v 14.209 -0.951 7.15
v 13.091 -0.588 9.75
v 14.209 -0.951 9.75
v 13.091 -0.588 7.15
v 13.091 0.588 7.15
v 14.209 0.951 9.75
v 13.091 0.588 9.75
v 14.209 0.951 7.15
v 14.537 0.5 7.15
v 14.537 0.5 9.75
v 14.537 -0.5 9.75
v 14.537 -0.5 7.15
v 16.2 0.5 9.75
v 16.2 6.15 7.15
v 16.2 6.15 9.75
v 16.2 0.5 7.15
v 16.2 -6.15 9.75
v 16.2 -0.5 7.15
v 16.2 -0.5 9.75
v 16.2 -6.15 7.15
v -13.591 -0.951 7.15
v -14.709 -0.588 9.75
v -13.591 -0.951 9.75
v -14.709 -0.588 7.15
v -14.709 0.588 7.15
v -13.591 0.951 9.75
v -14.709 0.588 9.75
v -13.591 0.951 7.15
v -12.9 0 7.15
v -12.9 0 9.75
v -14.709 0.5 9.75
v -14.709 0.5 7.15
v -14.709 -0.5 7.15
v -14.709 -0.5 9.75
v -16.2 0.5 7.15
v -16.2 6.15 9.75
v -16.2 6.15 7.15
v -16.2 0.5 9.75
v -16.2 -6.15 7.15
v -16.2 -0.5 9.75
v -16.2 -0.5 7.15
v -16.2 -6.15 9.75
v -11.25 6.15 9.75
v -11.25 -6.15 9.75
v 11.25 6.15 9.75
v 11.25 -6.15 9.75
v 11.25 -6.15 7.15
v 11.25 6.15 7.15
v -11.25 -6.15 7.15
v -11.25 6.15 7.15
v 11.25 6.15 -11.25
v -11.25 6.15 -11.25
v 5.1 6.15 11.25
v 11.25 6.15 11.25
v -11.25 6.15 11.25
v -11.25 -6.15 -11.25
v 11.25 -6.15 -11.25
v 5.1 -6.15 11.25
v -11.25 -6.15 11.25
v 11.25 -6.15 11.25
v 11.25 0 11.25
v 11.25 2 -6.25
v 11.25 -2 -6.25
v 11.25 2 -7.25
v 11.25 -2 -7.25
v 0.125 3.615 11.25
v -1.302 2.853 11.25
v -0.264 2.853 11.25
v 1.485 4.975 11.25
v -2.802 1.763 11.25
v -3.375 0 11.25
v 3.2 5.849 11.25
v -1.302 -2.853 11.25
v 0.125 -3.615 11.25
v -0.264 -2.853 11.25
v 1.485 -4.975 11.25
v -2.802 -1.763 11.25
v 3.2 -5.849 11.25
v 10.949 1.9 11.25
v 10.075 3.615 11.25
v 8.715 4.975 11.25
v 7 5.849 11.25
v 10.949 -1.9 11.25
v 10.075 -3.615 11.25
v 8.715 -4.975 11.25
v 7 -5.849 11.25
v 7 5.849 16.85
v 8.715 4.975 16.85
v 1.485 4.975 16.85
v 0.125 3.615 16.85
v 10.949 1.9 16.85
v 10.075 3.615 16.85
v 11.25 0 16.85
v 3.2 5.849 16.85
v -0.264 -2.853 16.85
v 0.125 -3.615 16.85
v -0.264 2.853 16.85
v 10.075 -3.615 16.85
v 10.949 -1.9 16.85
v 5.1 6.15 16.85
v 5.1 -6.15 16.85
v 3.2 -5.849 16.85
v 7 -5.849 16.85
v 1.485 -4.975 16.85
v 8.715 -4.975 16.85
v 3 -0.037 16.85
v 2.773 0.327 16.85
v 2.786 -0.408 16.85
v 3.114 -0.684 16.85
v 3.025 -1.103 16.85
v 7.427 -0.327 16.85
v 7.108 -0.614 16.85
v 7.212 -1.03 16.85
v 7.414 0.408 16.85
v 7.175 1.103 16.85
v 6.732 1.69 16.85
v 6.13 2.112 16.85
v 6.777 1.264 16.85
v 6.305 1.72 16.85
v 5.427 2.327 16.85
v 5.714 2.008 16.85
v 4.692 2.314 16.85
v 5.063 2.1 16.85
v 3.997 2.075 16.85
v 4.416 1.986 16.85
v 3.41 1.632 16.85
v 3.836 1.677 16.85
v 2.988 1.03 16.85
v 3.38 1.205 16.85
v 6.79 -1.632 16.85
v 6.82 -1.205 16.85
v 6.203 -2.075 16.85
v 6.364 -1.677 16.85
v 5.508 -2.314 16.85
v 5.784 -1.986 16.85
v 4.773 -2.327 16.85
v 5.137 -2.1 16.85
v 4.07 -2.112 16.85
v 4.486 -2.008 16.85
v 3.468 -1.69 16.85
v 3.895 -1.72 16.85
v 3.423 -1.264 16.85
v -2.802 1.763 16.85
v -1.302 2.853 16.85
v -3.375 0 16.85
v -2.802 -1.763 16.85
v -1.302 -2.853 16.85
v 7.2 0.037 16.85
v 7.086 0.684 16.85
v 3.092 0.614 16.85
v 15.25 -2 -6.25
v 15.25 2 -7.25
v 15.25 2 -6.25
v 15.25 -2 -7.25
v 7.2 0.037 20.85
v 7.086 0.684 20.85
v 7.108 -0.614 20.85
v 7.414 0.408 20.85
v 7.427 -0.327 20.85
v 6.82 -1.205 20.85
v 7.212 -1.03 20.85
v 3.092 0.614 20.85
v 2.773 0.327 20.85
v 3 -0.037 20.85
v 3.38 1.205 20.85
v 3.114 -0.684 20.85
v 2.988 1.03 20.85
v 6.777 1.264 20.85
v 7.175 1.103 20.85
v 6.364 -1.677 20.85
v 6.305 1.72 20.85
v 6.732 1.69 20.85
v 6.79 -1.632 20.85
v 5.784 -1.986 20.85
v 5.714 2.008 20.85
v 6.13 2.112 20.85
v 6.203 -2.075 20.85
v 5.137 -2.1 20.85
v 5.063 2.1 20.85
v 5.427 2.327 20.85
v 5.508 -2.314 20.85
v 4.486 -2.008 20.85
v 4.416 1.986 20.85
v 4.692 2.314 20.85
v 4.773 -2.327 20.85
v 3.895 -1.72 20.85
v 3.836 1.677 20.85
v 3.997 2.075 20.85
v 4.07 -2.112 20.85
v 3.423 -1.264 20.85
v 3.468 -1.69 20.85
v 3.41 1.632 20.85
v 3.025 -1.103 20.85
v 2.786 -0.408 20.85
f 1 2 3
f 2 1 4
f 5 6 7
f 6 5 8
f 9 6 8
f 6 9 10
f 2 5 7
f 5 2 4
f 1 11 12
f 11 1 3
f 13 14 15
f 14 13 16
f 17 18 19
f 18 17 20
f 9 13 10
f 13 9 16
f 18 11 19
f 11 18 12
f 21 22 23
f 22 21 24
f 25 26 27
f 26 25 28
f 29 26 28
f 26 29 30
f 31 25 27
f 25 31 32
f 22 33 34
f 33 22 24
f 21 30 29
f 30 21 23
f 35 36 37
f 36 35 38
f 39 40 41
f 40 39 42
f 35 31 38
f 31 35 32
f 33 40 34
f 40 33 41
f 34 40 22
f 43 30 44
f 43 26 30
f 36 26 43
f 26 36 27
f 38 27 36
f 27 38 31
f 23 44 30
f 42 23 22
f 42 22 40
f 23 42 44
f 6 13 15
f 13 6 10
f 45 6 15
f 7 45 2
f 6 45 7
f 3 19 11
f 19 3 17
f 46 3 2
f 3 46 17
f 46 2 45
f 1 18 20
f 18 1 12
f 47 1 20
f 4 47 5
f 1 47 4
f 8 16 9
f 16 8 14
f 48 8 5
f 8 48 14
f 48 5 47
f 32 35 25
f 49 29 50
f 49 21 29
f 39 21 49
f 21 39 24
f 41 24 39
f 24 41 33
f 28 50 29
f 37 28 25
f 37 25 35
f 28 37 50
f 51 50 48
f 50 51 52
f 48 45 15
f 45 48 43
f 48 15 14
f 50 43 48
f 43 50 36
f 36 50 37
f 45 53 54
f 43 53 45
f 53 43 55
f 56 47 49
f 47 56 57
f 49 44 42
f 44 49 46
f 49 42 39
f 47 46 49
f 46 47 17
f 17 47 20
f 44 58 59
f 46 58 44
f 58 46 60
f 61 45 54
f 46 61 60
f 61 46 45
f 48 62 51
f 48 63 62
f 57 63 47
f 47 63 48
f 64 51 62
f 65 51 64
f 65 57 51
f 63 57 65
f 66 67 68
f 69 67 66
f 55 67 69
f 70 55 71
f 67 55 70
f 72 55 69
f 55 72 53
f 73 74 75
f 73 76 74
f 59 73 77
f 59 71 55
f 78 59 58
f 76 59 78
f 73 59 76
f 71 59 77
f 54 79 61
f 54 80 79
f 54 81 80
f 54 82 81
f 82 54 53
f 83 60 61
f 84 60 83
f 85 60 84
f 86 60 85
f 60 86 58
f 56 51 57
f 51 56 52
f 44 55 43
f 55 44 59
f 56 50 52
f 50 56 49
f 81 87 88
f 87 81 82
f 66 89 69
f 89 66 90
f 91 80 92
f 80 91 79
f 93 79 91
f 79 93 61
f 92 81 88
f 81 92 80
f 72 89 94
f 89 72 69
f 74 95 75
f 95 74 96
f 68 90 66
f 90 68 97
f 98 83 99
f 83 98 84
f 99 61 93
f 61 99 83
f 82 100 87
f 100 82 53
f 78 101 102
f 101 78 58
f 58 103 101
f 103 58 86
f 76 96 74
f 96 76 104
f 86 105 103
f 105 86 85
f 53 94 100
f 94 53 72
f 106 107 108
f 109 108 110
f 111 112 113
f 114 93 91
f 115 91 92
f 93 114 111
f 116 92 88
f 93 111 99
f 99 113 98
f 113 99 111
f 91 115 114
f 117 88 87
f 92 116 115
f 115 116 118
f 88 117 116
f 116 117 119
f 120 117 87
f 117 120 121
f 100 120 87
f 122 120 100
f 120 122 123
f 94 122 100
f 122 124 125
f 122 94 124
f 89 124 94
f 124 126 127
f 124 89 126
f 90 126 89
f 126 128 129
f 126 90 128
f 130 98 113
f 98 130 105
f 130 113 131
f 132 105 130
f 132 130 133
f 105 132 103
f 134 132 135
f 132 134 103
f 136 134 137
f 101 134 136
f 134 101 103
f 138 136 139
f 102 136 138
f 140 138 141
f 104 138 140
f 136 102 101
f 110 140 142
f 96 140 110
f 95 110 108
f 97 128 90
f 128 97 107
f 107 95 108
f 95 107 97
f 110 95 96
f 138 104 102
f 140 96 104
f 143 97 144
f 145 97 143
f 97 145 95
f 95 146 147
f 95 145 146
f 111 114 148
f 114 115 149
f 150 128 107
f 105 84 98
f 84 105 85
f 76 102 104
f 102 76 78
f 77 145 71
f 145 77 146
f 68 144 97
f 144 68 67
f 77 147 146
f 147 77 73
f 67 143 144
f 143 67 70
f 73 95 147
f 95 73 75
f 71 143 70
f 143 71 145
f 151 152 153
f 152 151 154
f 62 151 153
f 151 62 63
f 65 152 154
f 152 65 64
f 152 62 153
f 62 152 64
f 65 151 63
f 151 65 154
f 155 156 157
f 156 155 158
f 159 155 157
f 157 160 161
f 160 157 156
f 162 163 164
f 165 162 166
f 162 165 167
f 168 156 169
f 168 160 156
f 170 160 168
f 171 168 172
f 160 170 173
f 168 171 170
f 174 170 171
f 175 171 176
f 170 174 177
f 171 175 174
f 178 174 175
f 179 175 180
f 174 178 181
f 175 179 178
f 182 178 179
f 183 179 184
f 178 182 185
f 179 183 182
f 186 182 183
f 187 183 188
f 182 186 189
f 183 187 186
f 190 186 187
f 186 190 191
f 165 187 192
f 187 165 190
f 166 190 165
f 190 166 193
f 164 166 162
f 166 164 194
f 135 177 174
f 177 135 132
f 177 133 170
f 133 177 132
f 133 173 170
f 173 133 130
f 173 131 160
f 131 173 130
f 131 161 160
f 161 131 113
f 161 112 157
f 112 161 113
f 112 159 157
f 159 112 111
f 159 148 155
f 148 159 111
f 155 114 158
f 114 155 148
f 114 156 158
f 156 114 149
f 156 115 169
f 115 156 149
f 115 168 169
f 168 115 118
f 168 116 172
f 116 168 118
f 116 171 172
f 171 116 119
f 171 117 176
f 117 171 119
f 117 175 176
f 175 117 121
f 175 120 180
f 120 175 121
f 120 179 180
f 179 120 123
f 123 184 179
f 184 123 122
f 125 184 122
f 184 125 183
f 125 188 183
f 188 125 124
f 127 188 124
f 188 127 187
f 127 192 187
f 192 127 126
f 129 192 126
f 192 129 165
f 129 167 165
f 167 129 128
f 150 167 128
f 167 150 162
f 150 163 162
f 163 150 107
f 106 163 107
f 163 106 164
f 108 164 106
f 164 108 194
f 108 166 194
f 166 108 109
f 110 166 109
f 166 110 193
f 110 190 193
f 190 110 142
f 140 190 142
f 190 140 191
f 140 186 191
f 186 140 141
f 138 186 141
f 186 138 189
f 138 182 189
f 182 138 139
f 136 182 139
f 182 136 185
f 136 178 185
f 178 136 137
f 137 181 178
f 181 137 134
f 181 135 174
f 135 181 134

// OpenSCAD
body_dims = [22.5,12.3,22.5];
body_length = body_dims[0];
body_width = body_dims[1];
body_height = body_dims[2];


wing_dims = [32.4, body_width, 2.6];
wing_len = wing_dims[0];
wing_thick = wing_dims[2];
wing_drop = 1.5;
wing_bolt_dia = 2;
wing_bolt_spacing = 25.8 + wing_bolt_dia;
wing_split = 1;

gear_drop = 5.6;
spur_dia=6;
spur_pos= body_dims[0]/2 -15 + spur_dia/2;


shaft_len=5.5;



mg90s_spline_r1=4.2 /2;
mg90s_spline_r2=4.7 /2;
mg90s_spline_n=20;
mg90s_spline_h=4;

function spline_list(r1=mg90s_spline_r1, r2=mg90s_spline_r2, n=mg90s_spline_n) = 
    [for(theta = [0:360/n:360]) for(p=[[r1,0],[r2,180/n]]) p[0]* [sin(theta+p[1]), cos(theta+p[1])]];

module spline_sect(r1=mg90s_spline_r1, r2=mg90s_spline_r2, n=mg90s_spline_n){
    polygon(spline_list(r1,r2,n));
}

module spline_shaft(r1=mg90s_spline_r1, r2=mg90s_spline_r2, n=mg90s_spline_n, h=mg90s_spline_h){
    linear_extrude(height = h) spline_sect(r1,r2,n);
}


function mg90s_shaft_pos() = [(body_length-body_width)/2,0,body_height/2 + gear_drop];
function mg90s_shaft_axis() = [0,0,1];

function mg90s_bolt_top_pos() = [for(mirr=[1,-1]) [mirr * wing_bolt_spacing/2, 0, (body_height-wing_thick)/2-wing_drop]];
function mg90s_bolt_bottom_pos() = [for(pos = mg90s_bolt_top_pos()) pos - [0,0,wing_thick] ];

function mg90s_bolt_top_axes() = [[0,0,1], [0,0,1]];
function mg90s_bolt_bottom_axes() = -1 * mg90s_bolt_top_axes();

module mg90s(a=0){
    cube(body_dims, center=true);
    translate([body_length - body_width,0,body_height]/2)cylinder(d=body_width,h=gear_drop);
    translate([spur_pos,0,body_height]/2)cylinder(d=spur_dia,h=gear_drop);
    translate([body_length/2,0,-body_height/2 + 4.5])cube([8,4,1], center=true);

    difference(){
        translate([0,0,(body_height-wing_thick)/2-wing_drop])cube(wing_dims, center=true);
        for(mirr=[1,-1]){
            translate([mirr * wing_bolt_spacing/2,0,0]) cylinder(d=wing_bolt_dia, h=body_height, center=true);
            translate([mirr * (wing_len + wing_bolt_spacing)/4,0,0]) cube([(wing_len-wing_bolt_spacing)/2, wing_split, body_height], center=true);
        }
    }

    translate(mg90s_shaft_pos()) rotate(mg90s_shaft_axis()) rotate([0,0,a]) spline_shaft();
}


mg90s();
